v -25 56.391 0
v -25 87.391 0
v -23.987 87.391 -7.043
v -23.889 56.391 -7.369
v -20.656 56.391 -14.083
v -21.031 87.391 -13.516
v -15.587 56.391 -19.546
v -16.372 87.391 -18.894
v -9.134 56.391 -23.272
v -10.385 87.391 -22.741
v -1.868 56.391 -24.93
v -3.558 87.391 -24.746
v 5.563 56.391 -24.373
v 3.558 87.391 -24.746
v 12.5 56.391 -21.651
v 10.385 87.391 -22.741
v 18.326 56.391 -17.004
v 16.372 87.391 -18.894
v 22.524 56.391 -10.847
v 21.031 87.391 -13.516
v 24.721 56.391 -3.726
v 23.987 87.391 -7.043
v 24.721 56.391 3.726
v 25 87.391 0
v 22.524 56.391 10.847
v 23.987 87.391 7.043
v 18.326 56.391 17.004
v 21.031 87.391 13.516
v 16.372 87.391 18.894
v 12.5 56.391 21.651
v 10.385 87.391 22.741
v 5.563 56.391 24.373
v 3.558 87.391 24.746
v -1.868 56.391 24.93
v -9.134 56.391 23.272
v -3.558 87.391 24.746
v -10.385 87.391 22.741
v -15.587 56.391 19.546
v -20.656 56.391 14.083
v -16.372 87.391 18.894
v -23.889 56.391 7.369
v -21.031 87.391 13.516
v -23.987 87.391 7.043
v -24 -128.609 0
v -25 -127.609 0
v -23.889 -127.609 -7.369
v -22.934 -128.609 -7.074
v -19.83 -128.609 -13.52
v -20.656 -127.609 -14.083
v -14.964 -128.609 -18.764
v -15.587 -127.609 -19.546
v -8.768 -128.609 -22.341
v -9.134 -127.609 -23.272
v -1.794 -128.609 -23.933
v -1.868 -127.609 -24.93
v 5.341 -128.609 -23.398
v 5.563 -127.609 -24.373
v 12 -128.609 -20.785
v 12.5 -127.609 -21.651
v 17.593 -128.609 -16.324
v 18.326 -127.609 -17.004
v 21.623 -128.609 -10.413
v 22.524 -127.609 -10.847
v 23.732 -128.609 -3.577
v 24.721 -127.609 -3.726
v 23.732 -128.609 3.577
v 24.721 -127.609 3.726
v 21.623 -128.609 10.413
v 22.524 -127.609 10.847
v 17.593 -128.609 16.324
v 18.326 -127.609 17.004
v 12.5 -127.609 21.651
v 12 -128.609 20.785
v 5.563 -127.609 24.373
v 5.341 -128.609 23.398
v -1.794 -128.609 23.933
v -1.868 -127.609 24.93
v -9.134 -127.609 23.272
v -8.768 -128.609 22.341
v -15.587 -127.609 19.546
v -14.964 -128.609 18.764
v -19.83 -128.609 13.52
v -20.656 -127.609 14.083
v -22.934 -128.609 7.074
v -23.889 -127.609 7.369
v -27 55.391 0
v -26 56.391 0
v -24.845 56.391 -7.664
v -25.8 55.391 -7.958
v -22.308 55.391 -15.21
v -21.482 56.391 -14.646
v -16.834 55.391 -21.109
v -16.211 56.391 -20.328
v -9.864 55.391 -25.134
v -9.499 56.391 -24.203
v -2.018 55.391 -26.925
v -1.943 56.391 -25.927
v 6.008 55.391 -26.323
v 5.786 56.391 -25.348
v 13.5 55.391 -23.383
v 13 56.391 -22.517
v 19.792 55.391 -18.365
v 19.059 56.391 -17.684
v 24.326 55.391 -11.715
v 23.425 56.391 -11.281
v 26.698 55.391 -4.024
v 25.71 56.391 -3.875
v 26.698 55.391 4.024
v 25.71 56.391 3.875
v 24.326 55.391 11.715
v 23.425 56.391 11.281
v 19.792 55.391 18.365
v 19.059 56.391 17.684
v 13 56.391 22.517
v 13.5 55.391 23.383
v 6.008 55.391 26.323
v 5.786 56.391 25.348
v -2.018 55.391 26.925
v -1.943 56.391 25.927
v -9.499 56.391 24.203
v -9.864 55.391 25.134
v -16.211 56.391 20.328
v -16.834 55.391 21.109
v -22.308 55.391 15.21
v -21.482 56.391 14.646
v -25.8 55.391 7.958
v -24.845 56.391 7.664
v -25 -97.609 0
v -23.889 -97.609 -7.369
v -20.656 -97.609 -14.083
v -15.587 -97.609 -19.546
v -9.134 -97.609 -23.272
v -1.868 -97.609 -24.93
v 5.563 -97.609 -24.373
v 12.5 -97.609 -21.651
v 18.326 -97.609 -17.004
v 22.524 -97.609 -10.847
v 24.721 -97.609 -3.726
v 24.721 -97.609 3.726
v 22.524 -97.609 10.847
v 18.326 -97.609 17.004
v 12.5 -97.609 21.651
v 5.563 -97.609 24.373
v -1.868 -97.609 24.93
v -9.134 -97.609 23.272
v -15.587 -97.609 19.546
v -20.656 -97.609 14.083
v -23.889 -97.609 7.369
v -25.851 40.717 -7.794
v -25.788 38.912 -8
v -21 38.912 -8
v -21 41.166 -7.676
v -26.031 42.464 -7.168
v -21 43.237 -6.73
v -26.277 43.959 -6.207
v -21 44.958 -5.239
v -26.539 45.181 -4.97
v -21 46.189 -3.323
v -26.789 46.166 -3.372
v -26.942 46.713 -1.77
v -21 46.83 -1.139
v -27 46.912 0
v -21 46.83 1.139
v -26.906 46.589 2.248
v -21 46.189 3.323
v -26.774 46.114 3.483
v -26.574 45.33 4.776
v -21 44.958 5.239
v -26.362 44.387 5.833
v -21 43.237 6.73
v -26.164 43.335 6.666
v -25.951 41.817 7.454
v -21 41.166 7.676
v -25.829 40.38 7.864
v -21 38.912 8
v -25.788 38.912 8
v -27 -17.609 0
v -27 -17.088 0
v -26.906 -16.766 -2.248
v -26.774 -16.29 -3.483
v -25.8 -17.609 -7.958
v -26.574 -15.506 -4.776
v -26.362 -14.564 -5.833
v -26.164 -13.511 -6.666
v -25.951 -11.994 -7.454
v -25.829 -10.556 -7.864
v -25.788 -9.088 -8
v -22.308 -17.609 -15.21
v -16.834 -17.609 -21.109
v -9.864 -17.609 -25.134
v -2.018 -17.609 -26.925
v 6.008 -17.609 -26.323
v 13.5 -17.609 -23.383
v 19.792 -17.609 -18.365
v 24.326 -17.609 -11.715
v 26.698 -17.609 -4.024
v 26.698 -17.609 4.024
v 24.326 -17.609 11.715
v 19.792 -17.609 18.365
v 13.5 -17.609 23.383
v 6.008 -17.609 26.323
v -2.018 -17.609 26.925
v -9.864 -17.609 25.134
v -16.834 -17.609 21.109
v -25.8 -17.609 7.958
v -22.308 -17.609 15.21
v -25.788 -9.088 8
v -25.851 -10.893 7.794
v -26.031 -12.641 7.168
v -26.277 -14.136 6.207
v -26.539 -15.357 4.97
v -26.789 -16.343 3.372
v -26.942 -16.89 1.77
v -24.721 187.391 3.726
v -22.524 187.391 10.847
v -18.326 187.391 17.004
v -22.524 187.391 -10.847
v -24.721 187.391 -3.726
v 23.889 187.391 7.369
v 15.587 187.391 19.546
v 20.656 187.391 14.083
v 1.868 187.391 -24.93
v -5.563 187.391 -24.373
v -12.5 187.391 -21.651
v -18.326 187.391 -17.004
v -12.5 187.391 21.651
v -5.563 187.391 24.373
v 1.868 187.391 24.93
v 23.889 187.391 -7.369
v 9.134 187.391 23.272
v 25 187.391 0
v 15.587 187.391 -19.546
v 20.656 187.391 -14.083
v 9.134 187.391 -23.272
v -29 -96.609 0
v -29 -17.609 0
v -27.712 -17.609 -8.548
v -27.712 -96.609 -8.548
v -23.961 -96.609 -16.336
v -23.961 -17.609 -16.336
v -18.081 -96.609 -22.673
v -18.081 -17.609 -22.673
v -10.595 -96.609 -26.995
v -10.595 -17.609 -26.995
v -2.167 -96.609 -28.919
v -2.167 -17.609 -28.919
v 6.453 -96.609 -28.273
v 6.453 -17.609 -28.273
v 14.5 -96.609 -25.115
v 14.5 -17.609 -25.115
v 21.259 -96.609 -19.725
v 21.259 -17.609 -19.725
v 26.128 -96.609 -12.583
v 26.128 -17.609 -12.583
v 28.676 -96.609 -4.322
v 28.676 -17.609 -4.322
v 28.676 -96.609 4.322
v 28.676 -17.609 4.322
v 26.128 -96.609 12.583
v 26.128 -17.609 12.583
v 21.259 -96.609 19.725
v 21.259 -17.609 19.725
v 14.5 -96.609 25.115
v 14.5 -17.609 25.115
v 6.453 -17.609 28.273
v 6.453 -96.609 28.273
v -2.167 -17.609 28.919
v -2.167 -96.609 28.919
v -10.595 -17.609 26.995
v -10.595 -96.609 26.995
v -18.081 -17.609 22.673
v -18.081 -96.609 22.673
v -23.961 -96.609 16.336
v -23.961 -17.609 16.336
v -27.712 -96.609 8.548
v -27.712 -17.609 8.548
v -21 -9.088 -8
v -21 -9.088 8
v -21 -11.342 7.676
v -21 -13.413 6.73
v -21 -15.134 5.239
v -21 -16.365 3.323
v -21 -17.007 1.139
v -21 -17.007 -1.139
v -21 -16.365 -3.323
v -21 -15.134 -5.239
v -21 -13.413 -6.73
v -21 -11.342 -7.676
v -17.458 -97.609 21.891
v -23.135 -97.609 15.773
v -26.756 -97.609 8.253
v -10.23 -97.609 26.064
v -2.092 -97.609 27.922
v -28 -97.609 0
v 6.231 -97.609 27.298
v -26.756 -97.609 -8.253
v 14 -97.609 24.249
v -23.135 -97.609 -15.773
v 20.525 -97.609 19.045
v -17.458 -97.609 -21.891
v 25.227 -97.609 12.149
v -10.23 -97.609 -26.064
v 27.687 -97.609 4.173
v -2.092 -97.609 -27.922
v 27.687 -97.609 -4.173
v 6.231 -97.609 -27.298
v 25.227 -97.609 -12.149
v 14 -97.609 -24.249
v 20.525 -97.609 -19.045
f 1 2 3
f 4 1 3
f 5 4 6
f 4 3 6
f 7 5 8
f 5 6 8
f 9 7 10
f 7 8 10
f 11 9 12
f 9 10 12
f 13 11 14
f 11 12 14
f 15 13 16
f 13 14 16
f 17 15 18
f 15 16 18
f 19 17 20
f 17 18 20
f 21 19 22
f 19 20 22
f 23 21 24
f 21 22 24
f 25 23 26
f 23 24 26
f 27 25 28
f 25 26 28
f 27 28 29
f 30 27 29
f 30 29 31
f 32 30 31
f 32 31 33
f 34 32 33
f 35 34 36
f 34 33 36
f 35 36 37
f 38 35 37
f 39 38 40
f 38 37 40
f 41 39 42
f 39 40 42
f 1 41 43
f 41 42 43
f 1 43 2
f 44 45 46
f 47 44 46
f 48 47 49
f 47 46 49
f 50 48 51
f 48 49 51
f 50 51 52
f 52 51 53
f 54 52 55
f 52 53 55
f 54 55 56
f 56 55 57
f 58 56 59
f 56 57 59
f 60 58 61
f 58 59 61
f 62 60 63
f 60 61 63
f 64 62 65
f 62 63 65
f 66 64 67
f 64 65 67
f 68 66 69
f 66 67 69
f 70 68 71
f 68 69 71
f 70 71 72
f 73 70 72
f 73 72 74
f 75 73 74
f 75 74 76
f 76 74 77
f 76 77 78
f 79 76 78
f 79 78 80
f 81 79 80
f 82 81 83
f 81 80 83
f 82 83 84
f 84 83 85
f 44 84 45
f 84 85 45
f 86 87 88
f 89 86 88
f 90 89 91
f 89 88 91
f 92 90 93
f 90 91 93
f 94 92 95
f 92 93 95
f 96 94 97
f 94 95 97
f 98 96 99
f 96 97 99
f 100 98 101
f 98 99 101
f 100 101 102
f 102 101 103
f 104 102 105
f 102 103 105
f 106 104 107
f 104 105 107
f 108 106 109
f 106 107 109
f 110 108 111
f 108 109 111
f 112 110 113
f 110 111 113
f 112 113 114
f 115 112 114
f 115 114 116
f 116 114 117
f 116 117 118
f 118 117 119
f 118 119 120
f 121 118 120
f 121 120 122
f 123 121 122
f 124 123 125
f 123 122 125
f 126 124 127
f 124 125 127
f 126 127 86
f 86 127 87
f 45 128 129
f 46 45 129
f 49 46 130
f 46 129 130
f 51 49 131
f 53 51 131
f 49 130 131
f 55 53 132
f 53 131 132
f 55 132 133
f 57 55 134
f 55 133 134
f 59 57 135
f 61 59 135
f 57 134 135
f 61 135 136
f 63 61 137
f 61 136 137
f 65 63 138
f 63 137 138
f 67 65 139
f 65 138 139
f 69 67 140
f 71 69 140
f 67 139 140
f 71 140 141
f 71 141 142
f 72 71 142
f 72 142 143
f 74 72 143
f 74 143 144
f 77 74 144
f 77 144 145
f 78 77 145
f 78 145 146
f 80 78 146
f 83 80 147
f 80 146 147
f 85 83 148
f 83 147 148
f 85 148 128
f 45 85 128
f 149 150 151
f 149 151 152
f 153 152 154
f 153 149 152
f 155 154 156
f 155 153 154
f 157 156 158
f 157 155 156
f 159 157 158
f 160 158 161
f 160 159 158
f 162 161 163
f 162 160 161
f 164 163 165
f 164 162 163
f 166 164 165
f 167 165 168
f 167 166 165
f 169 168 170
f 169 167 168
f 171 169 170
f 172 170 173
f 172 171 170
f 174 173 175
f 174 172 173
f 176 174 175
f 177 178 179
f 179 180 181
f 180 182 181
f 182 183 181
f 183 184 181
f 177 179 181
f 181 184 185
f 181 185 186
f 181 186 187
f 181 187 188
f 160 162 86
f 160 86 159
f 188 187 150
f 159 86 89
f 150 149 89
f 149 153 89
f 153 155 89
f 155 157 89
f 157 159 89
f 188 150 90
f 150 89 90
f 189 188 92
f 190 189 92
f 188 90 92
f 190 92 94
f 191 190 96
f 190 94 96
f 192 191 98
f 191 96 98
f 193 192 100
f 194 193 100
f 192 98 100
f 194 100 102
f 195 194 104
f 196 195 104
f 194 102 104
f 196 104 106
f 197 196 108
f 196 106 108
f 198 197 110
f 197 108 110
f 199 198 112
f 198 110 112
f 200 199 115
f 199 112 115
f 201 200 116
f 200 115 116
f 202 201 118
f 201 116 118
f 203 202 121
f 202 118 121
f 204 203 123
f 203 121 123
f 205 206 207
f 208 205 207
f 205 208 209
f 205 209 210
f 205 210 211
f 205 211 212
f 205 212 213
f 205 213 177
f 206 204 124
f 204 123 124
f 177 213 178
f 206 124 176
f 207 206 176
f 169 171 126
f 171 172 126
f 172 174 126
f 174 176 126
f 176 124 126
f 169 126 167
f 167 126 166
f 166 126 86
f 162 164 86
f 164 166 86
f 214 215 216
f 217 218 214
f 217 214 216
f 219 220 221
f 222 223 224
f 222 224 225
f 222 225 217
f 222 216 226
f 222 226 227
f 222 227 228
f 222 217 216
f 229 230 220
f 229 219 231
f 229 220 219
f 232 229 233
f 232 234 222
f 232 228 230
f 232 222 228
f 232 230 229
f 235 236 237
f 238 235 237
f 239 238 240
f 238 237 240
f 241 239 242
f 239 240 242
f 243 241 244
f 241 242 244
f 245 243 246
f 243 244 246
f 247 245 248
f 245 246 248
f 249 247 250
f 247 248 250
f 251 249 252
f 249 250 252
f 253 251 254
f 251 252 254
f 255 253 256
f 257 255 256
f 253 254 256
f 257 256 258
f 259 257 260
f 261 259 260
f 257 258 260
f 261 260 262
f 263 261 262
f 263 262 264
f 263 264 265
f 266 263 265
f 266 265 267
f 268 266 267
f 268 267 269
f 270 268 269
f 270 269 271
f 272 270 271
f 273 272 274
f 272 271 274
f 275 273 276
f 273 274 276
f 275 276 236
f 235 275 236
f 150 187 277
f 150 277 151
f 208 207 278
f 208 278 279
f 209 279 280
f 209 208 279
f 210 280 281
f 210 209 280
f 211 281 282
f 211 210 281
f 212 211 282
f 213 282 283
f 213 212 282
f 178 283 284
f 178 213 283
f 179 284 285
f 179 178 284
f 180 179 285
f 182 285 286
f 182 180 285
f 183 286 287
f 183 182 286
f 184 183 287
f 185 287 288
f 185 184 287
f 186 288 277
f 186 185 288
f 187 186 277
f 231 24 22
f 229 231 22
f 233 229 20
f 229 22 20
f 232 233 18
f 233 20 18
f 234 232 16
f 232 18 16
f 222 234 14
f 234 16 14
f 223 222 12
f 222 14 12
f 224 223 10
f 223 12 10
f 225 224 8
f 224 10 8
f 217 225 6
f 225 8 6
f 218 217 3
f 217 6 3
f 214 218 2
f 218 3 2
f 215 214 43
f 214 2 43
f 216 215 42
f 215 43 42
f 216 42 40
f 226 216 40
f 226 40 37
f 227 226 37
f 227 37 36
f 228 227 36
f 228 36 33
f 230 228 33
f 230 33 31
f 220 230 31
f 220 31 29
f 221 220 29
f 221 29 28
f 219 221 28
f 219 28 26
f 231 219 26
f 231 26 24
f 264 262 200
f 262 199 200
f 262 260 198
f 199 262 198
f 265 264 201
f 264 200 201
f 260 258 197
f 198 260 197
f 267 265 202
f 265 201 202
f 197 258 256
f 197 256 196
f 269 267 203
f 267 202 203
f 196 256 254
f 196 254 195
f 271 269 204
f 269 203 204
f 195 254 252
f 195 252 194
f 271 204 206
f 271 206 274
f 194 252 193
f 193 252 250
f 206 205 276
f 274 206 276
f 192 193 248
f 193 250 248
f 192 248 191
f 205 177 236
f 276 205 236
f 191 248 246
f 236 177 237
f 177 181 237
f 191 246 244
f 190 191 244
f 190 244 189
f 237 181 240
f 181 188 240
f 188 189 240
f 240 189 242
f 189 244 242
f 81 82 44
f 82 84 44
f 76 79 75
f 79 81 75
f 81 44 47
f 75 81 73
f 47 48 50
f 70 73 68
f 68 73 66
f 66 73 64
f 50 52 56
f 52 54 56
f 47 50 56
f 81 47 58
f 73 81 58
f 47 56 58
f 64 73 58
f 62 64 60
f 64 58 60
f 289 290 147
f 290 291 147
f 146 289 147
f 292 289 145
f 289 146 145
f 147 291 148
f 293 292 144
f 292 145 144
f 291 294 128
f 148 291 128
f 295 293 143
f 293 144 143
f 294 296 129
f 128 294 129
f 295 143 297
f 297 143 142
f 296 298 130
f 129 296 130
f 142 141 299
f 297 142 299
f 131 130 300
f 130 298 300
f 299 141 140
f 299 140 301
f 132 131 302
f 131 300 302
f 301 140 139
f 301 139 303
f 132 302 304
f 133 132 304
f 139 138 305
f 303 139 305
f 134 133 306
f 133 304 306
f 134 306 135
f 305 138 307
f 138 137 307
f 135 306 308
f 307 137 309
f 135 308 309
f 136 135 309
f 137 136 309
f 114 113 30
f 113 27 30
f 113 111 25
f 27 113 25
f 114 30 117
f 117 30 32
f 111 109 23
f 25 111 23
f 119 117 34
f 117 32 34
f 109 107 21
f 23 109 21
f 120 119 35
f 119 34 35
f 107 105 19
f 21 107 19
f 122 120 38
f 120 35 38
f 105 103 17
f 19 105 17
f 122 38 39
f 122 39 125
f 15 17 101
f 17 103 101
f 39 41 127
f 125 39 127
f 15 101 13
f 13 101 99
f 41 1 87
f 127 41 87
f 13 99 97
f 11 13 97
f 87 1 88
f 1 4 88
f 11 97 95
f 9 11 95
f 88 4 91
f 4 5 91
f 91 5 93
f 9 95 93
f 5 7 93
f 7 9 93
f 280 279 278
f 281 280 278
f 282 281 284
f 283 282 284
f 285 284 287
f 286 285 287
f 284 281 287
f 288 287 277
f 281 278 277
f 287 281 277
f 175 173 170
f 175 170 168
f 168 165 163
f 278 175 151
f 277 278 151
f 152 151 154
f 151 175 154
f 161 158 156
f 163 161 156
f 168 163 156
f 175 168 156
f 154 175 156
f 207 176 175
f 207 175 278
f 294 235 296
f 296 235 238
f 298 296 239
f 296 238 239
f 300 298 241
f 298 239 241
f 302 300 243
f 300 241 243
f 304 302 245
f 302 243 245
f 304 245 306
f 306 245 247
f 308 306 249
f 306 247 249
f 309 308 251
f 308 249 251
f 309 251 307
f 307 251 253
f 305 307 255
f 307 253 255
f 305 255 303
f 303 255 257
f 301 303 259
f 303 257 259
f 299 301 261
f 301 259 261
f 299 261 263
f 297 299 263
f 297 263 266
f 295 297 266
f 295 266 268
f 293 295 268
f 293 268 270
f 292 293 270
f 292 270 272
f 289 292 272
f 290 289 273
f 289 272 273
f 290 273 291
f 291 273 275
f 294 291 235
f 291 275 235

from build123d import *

# Parameters (mm, degrees)
CHAMFER1_SIZE       = 1
CUT_EXTRUDE1_DEPTH  = 6
SKETCH3_R           = 25
BOSS_EXTRUDE1_DEPTH = 100


with BuildPart() as part:
    # Sketch1 → Revolve1 (revolve)
    with BuildSketch(Plane.XY):
        Polygon((0, 87.391304348), (0, -128.608695652), (-25, -128.608695652), (-25, -97.608695652), (-29, -97.608695652), (-29, -17.608695652), (-27, -17.608695652), (-27, 56.391304348), (-25, 56.391304348), (-25, 87.391304348), align=None)
    revolve(axis=Axis((0, 87.391304348, 0), (0, -1, 0)))

    # Chamfer1
    chamfer1_edges = [part.edges().sort_by_distance(p)[0] for p in [
        (27, 56.391304348, 0),
        (25, -128.608695652, 0),
        (29, -97.608695652, 0),
    ]]
    chamfer(chamfer1_edges, length=CHAMFER1_SIZE)

    # Sketch2 → Cut-Extrude1 (cut)
    with BuildSketch(Plane.ZY.offset(27)):
        with BuildLine():
            Line((-8, -9.088294883), (-8, 38.911705117))
            ThreePointArc((-8, 38.911705117), (0, 46.911705117), (8, 38.911705117))
            Line((8, 38.911705117), (8, -9.088294883))
            ThreePointArc((8, -9.088294883), (0, -17.088294883), (-8, -9.088294883))
        make_face()
    extrude(amount=-CUT_EXTRUDE1_DEPTH, mode=Mode.SUBTRACT)

    # Sketch3 → Boss-Extrude1 (add)
    with BuildSketch(Plane(origin=(0, 87.391304348, 0), x_dir=(1, 0, 0), z_dir=(0, 1, 0))):
        Circle(SKETCH3_R)
    extrude(amount=BOSS_EXTRUDE1_DEPTH)


solid = part.part
